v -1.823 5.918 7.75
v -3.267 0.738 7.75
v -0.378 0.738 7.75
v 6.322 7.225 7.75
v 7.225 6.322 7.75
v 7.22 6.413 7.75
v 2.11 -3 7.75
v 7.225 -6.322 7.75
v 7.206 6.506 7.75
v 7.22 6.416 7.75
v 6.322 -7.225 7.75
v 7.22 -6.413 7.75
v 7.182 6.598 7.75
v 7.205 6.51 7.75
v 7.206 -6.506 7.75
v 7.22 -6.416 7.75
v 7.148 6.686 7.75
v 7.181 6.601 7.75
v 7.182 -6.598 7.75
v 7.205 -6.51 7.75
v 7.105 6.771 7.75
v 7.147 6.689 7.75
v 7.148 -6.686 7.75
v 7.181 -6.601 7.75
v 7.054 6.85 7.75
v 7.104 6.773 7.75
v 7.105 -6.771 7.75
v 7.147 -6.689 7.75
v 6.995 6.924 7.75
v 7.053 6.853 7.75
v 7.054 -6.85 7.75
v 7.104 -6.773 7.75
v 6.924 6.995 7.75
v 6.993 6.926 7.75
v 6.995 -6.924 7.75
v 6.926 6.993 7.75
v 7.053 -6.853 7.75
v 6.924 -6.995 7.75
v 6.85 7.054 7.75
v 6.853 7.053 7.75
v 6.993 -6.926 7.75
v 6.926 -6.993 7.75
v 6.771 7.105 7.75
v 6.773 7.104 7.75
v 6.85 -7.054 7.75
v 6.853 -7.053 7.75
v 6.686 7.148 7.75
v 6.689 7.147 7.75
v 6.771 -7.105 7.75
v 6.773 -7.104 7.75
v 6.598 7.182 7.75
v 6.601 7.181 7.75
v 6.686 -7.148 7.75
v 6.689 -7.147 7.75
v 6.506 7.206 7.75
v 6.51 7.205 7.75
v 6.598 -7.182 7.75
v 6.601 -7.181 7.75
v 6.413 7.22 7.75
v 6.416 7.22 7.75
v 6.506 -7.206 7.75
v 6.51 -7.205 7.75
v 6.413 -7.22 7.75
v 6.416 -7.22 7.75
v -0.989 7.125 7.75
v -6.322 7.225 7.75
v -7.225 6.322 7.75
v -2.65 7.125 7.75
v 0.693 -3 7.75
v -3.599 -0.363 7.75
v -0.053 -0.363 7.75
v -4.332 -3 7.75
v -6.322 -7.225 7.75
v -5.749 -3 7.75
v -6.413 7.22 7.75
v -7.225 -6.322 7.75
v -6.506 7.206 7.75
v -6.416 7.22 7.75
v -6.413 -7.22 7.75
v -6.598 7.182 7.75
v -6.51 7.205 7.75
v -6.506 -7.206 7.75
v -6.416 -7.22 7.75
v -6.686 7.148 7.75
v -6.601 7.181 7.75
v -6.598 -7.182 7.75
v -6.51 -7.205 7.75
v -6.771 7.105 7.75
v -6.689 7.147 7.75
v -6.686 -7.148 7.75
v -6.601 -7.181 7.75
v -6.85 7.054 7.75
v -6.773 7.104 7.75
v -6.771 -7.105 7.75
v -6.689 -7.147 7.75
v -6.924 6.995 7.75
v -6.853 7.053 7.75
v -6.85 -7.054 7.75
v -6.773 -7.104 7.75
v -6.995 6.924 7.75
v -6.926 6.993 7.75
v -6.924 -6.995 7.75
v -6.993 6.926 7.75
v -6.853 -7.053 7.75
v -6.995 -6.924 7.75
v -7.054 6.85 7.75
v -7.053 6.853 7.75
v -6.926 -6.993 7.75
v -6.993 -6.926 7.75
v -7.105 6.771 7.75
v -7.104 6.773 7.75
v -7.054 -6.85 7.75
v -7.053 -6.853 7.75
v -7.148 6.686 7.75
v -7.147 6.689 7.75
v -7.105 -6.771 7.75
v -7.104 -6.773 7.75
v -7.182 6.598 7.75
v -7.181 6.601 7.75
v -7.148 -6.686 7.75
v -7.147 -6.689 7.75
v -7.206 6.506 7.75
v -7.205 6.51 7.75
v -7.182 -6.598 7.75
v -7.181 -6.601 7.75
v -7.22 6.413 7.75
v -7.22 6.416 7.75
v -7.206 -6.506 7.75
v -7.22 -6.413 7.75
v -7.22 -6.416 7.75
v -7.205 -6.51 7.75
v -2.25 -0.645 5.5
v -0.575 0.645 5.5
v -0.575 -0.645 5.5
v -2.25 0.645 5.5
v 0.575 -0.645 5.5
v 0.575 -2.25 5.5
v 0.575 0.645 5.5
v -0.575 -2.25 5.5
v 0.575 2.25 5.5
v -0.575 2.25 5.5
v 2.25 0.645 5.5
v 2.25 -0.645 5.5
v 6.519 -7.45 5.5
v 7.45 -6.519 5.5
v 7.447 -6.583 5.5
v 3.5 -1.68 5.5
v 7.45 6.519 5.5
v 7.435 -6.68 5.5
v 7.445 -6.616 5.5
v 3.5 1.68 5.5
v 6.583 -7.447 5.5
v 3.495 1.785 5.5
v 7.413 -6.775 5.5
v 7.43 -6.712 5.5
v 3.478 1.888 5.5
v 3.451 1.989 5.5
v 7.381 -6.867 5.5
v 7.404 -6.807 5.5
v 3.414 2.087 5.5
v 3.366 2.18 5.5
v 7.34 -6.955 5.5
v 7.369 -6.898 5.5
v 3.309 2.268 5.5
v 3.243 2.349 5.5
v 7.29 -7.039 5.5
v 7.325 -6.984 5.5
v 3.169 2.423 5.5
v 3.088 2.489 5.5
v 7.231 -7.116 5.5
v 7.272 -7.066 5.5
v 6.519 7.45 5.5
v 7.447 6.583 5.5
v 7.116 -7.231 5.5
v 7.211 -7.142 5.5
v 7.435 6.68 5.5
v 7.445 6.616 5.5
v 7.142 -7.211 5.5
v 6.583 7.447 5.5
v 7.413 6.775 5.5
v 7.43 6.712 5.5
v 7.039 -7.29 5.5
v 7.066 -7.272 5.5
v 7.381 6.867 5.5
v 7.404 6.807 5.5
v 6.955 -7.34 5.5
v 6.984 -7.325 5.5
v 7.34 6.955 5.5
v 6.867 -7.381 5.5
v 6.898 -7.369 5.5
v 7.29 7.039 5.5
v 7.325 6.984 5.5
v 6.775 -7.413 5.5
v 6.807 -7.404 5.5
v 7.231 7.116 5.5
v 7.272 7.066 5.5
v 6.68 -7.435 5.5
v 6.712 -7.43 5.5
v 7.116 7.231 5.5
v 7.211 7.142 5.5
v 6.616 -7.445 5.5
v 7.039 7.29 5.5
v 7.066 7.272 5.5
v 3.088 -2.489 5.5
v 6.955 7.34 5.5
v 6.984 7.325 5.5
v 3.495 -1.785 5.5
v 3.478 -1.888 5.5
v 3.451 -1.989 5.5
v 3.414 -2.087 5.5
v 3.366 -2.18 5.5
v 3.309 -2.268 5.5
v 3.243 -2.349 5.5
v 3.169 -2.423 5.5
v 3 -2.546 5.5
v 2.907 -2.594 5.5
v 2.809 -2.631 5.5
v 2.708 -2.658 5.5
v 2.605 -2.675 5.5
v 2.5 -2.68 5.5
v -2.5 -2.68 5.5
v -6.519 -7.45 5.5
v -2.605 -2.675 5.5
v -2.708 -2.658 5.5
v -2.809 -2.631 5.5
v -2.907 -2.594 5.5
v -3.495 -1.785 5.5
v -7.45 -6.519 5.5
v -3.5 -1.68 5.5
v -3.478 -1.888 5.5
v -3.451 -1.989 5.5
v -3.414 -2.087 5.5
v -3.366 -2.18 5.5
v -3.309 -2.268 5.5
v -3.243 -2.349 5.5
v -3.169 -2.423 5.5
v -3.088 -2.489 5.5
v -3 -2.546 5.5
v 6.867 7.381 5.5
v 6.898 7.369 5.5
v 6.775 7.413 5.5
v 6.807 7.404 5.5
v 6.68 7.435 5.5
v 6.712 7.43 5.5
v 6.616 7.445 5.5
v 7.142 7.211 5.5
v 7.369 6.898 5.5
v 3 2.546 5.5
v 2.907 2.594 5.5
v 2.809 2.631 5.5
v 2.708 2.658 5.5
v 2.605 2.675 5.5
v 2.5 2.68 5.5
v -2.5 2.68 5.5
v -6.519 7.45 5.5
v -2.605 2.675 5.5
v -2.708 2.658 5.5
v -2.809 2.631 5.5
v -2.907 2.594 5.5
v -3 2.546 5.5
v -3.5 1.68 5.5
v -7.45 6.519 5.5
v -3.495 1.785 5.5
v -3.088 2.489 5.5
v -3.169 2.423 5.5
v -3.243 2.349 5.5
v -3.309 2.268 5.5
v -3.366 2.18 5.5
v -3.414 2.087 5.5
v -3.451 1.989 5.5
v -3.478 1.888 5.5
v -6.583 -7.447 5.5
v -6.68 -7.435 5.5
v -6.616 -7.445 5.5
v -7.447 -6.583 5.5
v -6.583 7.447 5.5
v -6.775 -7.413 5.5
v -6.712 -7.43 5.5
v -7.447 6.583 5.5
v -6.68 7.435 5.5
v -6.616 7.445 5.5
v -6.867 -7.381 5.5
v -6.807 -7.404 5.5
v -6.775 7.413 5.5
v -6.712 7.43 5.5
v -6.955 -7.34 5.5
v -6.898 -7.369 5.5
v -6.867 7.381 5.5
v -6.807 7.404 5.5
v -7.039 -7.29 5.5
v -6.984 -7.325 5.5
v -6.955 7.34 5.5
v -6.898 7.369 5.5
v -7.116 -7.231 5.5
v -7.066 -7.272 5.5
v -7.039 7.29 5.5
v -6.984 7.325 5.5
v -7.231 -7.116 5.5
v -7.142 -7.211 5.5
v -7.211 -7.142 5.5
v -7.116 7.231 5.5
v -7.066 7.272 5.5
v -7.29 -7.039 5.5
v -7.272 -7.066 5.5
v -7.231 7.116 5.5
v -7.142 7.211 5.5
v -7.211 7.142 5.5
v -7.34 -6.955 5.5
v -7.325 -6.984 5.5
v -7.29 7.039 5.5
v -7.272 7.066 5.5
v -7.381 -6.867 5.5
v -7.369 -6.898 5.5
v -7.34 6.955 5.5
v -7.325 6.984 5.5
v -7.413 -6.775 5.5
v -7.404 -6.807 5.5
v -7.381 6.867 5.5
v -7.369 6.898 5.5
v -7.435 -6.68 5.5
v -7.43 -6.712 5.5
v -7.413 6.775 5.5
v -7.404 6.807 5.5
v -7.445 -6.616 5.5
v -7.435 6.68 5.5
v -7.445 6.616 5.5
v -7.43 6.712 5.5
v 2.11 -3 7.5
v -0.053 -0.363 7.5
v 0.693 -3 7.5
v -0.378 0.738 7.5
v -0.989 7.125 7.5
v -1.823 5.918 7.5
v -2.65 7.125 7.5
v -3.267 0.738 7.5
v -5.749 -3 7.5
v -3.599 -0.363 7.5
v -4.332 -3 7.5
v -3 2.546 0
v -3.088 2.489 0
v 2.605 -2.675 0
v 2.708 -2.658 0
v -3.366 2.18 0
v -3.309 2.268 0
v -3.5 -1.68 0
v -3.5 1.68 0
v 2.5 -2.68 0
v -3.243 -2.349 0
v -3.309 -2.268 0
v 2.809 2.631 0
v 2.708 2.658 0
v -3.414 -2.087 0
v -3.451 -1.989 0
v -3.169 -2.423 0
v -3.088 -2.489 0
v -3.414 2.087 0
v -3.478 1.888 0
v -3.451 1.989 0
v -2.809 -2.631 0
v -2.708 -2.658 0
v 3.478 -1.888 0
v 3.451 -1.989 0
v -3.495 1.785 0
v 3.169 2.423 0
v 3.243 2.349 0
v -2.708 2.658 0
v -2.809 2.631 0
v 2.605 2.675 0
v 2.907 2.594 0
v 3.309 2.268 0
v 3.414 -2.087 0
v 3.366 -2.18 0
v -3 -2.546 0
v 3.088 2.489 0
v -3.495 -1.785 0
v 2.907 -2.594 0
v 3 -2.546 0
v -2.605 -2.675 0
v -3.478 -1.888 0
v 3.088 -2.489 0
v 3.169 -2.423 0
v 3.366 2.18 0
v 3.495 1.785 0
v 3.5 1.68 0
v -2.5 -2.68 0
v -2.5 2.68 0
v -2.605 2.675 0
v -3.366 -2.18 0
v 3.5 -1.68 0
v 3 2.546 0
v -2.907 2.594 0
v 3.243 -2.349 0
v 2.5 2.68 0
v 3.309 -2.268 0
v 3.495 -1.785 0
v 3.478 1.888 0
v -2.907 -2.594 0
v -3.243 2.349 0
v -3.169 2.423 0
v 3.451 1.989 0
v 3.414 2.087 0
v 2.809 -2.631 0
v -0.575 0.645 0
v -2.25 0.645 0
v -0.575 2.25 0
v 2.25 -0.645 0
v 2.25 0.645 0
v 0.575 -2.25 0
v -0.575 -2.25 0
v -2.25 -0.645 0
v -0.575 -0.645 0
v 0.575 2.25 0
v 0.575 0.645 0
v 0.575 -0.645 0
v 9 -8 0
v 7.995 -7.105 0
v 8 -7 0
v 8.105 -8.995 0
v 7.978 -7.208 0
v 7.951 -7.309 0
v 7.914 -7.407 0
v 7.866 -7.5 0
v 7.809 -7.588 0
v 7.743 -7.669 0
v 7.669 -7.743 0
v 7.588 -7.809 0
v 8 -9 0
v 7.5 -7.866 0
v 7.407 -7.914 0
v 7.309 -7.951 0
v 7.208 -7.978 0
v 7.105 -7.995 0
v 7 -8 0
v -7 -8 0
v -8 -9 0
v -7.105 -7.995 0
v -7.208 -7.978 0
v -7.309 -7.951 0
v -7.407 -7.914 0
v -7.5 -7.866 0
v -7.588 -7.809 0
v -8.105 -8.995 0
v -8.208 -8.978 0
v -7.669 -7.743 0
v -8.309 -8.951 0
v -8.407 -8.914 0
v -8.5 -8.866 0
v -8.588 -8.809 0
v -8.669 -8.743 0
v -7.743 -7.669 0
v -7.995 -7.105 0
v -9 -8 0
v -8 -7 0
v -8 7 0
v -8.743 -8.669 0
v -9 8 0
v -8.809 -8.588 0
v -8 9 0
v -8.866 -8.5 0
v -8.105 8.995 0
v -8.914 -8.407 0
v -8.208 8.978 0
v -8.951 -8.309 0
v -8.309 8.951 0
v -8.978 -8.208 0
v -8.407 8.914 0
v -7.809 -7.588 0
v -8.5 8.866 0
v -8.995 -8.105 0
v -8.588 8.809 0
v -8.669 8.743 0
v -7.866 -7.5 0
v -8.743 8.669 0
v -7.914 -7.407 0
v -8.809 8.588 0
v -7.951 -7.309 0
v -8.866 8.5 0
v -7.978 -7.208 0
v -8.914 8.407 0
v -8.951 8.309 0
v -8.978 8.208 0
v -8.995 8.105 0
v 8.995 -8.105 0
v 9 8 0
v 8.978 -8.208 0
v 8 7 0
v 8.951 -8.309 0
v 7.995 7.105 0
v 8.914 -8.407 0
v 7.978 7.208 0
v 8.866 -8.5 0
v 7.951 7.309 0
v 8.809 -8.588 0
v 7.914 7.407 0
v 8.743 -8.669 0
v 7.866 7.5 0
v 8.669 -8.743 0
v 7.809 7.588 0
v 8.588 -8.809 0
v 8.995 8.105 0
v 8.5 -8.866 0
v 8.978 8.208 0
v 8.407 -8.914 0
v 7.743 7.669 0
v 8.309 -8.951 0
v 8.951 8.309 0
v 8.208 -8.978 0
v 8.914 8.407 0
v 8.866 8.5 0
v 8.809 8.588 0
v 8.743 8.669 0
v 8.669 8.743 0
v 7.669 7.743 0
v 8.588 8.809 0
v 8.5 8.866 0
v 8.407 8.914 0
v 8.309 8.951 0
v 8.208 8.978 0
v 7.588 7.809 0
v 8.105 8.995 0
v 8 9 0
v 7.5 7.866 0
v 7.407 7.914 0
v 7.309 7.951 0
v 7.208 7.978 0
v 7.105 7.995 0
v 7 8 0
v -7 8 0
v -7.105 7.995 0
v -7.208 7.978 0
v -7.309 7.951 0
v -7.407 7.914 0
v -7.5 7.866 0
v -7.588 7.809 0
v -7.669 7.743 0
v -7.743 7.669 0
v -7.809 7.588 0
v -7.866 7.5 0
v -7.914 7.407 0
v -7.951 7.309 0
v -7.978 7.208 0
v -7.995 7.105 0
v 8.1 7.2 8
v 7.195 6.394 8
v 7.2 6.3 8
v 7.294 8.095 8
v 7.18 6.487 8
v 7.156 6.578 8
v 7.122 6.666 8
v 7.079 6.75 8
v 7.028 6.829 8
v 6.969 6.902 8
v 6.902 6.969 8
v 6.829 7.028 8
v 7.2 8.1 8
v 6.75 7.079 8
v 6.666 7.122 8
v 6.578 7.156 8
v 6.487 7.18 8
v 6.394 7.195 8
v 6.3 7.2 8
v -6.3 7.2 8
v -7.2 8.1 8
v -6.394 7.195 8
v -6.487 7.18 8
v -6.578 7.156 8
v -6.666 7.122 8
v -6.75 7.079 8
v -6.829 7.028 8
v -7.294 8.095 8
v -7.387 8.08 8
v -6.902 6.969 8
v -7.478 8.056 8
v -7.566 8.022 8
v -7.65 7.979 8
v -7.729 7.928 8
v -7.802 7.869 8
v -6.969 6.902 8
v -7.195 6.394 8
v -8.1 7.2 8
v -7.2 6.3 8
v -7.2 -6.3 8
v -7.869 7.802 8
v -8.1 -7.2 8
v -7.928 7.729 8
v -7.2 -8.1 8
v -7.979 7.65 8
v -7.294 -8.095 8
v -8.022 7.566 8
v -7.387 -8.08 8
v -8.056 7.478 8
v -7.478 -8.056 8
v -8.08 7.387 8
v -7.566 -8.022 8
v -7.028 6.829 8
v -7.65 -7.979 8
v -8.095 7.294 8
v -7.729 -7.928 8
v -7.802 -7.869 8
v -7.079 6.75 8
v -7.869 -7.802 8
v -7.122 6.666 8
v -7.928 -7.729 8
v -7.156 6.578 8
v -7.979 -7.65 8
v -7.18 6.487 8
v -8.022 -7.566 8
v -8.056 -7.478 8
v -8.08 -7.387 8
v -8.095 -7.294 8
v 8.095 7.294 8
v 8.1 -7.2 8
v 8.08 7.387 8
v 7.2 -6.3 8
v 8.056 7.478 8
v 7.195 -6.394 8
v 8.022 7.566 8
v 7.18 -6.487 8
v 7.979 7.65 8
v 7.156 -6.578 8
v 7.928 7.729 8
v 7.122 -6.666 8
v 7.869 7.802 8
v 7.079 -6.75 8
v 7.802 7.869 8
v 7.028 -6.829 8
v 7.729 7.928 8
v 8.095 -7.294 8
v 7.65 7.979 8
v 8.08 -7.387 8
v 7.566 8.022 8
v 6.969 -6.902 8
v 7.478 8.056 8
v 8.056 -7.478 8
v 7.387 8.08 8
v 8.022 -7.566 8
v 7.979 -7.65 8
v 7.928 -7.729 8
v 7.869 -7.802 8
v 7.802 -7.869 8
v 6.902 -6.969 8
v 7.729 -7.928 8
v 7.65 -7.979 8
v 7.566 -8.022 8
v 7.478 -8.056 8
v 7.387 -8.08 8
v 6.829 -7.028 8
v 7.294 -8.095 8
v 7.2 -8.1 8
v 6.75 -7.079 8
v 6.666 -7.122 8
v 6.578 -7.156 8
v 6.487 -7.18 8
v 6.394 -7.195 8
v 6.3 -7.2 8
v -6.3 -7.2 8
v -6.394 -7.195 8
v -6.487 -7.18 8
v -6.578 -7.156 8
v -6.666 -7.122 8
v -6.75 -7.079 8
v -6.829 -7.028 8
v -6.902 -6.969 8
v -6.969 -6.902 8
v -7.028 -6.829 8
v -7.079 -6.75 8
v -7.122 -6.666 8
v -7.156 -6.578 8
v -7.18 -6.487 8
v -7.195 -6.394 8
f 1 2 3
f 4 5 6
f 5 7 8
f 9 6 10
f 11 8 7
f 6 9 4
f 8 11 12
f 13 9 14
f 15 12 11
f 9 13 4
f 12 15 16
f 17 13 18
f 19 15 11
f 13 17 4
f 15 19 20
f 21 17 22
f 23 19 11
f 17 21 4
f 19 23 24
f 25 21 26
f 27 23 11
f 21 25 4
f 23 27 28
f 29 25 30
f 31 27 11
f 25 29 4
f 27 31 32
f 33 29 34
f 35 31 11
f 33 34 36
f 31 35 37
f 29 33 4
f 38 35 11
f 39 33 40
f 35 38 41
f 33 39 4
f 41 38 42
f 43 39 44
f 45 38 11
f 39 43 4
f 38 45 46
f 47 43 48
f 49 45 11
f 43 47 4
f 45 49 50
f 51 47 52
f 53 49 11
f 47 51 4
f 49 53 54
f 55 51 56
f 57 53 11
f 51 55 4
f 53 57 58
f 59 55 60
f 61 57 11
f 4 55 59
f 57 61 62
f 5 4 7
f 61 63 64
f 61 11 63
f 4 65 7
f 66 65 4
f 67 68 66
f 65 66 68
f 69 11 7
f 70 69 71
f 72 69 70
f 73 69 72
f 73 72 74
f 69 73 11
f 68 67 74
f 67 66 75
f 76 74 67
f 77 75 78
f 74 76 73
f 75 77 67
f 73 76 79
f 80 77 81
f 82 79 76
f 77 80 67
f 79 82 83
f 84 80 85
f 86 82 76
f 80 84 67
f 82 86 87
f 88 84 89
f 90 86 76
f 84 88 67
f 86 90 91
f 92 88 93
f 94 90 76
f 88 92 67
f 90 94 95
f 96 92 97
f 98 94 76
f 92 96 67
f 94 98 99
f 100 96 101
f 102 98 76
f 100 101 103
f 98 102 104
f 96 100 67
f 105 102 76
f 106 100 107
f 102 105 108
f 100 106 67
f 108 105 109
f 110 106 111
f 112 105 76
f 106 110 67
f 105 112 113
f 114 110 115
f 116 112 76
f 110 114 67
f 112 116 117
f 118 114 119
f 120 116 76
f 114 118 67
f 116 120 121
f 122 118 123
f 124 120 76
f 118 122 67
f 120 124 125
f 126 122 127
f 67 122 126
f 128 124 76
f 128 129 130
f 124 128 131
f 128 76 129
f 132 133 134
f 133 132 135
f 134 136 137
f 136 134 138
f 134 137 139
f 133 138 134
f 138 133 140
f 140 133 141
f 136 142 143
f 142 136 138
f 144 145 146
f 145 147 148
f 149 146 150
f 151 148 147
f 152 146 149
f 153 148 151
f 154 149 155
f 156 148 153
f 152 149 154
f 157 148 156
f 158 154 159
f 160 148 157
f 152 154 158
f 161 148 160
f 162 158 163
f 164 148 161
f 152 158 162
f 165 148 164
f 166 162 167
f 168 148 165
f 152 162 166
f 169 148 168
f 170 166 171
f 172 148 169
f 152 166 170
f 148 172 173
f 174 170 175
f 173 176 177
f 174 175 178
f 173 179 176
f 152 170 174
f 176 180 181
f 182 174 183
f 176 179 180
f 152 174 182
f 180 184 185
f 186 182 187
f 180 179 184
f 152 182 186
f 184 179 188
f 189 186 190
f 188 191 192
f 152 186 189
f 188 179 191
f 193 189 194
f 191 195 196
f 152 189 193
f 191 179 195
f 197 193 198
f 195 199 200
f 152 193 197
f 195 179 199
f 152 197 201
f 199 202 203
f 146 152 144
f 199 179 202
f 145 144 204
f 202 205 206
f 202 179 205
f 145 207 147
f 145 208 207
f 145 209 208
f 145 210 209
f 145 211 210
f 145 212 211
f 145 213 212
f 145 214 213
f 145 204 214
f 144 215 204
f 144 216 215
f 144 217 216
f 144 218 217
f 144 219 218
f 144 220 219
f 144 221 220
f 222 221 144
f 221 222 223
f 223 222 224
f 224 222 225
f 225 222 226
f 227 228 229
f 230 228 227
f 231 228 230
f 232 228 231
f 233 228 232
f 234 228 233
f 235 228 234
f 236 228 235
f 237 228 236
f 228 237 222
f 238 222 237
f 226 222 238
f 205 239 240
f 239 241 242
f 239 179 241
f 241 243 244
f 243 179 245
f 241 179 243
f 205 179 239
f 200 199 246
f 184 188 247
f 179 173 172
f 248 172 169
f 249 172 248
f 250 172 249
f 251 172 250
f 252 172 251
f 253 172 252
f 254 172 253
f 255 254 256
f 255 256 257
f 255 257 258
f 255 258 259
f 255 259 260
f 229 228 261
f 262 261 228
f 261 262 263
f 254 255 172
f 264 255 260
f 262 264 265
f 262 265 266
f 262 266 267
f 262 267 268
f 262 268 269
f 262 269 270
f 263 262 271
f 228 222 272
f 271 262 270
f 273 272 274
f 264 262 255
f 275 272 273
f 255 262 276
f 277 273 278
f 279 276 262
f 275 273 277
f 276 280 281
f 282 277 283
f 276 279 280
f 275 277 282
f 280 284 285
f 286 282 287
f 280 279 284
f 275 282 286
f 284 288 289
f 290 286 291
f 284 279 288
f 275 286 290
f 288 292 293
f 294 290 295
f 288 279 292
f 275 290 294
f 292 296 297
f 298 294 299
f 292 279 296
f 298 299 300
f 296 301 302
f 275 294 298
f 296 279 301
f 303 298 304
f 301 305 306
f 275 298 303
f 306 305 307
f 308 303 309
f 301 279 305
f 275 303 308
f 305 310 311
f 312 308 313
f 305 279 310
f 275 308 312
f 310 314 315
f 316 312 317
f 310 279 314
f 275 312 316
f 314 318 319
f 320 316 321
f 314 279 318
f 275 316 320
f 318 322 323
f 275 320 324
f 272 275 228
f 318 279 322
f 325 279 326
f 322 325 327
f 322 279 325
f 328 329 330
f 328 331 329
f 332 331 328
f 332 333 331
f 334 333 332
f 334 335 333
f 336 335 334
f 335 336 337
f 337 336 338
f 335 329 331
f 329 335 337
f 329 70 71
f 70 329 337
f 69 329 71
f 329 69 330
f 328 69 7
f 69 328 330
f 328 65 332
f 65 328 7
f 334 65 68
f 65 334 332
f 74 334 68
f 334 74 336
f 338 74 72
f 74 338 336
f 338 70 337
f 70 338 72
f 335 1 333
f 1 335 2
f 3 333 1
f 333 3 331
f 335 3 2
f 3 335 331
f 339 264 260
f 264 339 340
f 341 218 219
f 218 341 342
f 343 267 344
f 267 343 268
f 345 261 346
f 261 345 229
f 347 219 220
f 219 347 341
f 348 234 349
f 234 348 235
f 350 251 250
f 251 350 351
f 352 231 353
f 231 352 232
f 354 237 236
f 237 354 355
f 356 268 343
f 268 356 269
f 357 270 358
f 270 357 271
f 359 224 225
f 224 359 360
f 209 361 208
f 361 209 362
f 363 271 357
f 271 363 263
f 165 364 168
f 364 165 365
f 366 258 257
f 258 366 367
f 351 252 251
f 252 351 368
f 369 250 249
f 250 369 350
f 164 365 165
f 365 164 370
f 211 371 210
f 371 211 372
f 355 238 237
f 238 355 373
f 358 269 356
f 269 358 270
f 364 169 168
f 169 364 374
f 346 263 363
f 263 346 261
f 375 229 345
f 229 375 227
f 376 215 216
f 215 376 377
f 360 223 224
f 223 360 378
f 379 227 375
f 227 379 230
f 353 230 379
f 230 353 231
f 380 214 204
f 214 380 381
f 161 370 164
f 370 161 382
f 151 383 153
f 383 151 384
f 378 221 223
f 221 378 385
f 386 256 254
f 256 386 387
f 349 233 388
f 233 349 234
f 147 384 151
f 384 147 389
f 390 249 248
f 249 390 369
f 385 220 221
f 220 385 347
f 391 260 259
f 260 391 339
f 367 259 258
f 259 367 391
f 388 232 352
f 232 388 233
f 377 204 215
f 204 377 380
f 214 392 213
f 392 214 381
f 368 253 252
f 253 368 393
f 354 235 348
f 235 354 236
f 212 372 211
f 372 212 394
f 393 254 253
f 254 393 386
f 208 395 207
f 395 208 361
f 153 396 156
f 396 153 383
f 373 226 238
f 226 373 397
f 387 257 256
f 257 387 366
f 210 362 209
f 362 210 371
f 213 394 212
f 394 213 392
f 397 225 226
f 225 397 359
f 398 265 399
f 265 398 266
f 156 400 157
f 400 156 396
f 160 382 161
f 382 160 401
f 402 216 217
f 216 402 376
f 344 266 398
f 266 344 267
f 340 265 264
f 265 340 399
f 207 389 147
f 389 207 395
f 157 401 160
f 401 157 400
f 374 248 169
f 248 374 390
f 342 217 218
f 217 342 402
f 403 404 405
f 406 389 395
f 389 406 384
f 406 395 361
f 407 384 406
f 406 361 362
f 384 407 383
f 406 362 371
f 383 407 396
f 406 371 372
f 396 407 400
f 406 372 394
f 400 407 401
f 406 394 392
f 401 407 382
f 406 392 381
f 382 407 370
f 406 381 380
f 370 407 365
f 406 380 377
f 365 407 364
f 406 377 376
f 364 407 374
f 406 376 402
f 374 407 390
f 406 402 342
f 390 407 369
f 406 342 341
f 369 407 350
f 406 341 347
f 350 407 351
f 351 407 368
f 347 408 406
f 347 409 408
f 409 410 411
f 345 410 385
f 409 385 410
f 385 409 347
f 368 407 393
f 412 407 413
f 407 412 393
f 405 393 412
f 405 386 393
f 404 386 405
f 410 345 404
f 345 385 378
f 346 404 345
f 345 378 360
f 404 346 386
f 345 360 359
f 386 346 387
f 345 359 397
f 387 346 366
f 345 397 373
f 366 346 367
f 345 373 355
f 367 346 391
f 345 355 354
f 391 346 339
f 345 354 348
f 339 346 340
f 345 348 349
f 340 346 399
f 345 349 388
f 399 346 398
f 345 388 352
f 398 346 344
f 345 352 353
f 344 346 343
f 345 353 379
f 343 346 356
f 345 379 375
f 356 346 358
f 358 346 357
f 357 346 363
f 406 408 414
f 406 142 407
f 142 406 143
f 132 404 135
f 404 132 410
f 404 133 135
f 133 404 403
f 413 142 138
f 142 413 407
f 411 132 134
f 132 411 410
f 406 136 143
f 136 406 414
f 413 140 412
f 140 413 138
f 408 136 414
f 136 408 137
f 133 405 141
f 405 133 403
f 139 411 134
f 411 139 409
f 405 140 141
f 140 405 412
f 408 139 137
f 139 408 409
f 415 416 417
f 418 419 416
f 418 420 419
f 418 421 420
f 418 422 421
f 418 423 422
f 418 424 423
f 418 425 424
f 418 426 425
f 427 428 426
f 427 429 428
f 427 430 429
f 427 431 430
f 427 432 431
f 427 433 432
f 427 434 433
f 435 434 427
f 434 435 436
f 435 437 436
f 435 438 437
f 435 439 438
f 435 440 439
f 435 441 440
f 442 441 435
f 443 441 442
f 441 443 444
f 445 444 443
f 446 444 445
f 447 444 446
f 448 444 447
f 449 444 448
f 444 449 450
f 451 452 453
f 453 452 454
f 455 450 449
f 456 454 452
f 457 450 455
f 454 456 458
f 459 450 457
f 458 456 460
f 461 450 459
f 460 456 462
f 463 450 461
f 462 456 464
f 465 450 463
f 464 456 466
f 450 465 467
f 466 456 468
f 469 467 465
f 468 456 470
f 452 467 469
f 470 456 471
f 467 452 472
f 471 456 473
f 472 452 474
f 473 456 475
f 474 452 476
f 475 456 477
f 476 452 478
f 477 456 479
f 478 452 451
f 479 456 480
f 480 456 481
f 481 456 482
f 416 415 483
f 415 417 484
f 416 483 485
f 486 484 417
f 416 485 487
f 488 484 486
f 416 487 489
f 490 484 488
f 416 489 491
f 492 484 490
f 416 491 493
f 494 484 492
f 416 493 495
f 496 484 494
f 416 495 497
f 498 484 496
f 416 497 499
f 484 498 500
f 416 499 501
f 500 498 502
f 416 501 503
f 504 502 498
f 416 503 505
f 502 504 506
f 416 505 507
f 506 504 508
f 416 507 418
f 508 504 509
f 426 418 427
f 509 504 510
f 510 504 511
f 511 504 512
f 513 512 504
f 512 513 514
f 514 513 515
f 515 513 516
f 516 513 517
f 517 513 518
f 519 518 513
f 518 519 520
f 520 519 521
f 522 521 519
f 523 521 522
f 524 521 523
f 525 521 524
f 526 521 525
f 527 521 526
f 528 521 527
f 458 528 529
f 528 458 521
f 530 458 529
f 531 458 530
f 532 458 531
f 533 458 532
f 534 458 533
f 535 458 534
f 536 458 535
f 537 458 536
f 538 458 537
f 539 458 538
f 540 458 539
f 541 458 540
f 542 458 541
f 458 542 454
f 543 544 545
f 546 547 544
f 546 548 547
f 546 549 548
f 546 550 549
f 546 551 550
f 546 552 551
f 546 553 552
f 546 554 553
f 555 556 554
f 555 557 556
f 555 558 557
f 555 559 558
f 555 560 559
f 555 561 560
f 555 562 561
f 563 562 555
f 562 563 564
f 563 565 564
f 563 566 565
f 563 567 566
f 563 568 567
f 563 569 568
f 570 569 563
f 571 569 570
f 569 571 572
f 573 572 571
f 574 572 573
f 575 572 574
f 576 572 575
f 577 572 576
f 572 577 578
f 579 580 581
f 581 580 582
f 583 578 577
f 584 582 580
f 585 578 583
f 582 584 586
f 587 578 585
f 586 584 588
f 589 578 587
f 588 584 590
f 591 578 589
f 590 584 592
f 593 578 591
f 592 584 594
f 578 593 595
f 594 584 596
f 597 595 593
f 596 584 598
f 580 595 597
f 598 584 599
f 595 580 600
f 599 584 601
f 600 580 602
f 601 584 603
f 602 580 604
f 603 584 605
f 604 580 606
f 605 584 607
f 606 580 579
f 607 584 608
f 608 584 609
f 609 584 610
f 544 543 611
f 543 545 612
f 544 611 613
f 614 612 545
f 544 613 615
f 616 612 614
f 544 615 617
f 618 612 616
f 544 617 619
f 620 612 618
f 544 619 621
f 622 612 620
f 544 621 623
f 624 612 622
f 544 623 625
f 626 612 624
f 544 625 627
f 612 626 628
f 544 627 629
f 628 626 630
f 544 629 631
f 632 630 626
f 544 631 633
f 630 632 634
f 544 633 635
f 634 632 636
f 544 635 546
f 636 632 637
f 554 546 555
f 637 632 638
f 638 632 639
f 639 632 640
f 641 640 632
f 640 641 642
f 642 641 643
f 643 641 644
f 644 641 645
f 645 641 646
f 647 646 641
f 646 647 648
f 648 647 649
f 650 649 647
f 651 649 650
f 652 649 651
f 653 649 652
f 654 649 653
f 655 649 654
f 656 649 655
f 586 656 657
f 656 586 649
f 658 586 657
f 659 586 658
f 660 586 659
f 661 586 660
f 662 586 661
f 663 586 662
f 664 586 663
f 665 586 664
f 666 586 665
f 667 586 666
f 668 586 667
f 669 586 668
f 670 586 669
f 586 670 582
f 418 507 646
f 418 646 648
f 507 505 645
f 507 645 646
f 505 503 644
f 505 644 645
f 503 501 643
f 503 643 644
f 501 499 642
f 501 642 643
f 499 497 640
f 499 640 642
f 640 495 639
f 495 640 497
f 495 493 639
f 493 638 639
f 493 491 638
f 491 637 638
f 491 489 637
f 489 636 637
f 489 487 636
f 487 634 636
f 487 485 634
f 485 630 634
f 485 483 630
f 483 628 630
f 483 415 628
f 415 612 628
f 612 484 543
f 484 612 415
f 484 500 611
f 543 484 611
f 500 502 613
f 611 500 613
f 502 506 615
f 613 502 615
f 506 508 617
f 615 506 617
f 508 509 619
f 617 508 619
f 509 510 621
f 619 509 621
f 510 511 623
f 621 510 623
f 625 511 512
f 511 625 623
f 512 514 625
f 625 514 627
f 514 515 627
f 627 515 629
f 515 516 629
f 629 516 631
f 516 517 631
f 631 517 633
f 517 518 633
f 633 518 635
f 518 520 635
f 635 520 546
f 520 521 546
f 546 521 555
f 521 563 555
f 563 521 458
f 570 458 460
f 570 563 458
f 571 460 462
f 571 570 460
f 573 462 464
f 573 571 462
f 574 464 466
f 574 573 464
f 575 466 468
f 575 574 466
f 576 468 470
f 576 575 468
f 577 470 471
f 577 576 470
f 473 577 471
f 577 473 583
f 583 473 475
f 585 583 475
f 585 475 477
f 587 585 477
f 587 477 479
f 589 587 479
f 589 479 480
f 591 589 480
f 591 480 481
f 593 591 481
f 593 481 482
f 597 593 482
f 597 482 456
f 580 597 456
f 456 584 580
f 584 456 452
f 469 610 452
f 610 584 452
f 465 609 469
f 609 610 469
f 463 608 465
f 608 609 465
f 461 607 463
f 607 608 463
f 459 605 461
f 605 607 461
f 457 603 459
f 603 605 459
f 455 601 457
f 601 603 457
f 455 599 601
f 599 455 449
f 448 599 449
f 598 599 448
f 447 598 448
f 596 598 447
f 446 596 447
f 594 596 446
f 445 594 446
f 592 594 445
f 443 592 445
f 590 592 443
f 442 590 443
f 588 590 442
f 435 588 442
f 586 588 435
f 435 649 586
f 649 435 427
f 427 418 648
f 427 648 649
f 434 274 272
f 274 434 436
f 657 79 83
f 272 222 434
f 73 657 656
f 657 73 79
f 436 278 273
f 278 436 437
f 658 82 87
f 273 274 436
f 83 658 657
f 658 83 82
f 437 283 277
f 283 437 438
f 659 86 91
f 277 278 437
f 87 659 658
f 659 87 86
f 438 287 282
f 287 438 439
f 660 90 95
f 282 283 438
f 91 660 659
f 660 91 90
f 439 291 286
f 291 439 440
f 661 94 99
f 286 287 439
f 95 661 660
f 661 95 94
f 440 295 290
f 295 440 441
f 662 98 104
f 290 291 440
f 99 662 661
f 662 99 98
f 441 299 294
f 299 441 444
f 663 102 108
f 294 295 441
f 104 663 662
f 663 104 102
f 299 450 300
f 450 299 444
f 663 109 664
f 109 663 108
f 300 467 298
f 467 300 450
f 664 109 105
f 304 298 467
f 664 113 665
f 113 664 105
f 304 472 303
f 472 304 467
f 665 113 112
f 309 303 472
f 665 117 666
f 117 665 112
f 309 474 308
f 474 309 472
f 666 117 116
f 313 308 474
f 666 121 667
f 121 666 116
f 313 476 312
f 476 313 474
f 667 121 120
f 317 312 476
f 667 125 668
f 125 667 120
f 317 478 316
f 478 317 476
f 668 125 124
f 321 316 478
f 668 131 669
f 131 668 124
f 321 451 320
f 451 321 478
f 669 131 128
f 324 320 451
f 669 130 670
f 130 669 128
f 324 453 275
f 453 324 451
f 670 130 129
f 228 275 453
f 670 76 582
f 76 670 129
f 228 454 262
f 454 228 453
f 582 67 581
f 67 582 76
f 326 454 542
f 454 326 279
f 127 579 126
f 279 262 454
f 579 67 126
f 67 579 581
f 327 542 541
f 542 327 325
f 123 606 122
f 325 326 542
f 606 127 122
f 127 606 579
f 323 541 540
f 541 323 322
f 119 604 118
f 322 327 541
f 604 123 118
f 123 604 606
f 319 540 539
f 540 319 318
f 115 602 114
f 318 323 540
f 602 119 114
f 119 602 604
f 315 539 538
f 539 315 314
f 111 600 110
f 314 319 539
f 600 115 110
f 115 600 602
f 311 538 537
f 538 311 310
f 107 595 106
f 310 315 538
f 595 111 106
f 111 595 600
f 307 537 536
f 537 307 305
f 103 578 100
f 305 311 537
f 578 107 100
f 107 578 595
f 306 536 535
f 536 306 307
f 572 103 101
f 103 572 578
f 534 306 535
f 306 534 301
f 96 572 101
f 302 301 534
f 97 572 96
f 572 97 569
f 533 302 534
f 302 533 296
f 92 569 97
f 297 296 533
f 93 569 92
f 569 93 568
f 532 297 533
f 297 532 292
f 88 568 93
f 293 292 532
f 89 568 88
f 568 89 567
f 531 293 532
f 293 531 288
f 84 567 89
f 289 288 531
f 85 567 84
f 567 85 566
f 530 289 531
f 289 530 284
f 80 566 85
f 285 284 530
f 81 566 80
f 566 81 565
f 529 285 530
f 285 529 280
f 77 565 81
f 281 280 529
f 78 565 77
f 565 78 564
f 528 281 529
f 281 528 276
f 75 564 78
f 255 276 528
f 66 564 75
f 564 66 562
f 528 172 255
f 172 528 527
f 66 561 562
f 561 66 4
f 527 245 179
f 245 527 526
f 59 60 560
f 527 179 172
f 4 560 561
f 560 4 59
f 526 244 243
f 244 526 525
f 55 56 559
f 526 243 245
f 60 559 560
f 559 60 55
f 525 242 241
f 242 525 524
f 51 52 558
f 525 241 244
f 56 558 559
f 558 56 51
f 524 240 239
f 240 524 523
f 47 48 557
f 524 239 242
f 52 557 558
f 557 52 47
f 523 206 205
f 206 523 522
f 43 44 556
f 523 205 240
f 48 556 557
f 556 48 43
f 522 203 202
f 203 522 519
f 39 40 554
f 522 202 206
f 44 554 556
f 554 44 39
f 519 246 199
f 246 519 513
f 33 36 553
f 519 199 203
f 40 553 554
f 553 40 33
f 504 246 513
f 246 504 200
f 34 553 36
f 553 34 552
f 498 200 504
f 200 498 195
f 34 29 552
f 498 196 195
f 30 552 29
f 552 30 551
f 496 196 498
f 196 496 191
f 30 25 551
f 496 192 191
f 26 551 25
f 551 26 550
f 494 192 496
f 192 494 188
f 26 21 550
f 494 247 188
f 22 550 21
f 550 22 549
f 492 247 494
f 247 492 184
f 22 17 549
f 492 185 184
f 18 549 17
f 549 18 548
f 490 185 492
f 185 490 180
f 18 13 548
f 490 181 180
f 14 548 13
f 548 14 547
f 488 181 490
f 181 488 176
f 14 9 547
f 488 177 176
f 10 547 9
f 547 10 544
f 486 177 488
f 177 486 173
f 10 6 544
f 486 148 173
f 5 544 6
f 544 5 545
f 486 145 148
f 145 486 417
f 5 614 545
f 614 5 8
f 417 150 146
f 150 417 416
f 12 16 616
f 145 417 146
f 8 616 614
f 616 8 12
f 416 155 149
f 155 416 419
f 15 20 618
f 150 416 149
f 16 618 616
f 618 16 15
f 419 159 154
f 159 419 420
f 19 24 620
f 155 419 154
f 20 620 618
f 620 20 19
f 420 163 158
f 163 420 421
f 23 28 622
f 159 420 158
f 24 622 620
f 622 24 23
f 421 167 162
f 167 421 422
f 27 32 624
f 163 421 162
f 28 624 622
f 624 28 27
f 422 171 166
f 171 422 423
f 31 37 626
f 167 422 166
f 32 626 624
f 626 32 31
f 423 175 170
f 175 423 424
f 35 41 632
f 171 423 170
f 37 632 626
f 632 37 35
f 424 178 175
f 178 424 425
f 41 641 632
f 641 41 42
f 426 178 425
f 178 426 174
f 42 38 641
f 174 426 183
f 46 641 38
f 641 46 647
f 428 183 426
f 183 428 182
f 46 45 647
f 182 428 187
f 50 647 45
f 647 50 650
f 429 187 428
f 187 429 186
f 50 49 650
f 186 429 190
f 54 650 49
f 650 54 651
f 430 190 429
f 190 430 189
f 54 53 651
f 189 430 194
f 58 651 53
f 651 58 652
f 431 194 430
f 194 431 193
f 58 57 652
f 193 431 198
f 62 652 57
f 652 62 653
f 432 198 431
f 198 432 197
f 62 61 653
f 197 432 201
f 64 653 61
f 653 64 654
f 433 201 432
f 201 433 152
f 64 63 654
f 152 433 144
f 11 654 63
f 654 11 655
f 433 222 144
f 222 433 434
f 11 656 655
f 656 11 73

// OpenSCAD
// Define higher resolution for transformations

$fn=60;


letter="A";

union() {
    // sides
    color("#FFA500")
    linear_extrude(height = 8, scale=0.90)
    difference() {
        offset(r=1) square(16, true);
        offset(r=1) square(14, true);
    }

    // top ceiling
    difference() {
        color("#FF8C00")
        translate([0,0,5.5])
            linear_extrude(height = 2.25)
            offset(r=1)
            square(13, true);
        translate([-6,-3,7.5])
            linear_extrude(height = 1)
            text(letter, 10, "Consolas");
    }

    // fitting support
    color("#FF7F50")
    translate([0, 0, 3.25])
    difference(){
        // housing fitting
        hull() {
            translate([2.50, 1.68, 0])   cylinder(6.5, 1, 1, true);
            translate([-2.50, 1.68, 0])  cylinder(6.5, 1, 1, true);
            translate([2.50, -1.68, 0])  cylinder(6.5, 1, 1, true);
            translate([-2.50, -1.68, 0]) cylinder(6.5, 1, 1, true);
        }
        // cross fitting cutoff
        cube([4.5, 1.29, 10], true);
        cube([1.15, 4.5, 10], true);
    }
}
